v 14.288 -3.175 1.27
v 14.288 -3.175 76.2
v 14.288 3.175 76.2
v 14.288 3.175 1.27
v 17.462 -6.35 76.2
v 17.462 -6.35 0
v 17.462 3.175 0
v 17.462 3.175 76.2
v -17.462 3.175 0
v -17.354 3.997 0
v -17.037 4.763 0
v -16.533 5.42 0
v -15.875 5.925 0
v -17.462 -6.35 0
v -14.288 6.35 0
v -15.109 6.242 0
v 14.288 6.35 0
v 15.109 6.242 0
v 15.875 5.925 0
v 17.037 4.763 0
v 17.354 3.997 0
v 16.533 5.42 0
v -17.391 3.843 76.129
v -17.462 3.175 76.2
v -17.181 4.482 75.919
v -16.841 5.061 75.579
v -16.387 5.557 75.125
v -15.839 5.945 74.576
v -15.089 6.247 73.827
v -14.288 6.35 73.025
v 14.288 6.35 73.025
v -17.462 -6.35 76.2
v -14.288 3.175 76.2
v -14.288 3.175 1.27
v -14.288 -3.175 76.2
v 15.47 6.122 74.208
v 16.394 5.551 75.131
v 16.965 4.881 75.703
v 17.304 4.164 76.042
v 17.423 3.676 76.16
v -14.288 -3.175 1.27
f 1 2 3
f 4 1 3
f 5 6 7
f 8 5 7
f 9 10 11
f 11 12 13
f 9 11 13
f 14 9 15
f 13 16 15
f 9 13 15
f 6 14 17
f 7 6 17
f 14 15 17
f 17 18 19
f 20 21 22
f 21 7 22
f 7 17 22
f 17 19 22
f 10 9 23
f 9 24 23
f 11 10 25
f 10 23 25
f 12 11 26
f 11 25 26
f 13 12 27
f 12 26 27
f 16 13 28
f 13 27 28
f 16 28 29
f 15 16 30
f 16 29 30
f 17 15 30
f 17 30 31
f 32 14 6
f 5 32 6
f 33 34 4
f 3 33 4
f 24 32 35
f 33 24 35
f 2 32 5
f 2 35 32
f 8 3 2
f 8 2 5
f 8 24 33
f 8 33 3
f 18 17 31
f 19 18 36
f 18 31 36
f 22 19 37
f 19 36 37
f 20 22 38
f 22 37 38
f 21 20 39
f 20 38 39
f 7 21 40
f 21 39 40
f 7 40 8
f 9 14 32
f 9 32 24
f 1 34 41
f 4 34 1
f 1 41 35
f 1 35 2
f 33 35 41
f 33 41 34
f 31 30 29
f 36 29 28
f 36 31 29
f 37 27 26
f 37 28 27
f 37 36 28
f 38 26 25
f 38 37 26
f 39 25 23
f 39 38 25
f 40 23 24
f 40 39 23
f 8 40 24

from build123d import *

# Parameters (mm, degrees)
SKETCH1_W           = 34.925
SKETCH1_H           = 12.7
BOSS_EXTRUDE1_DEPTH = 76.2
SKETCH2_W           = 28.575
SKETCH2_H           = 6.35
CUT_EXTRUDE1_DEPTH  = 74.93
FILLET1_R           = 3.175


with BuildPart() as part:
    # Sketch1 → Boss-Extrude1 (new body)
    with BuildSketch(Plane.XY):
        Rectangle(SKETCH1_W, SKETCH1_H)
    extrude(amount=BOSS_EXTRUDE1_DEPTH)

    # Sketch2 → Cut-Extrude1 (cut)
    with BuildSketch(Plane.XY.offset(76.2)):
        Rectangle(SKETCH2_W, SKETCH2_H)
    extrude(amount=-CUT_EXTRUDE1_DEPTH, mode=Mode.SUBTRACT)

    # Fillet1
    fillet1_edges = [part.edges().sort_by_distance(p)[0] for p in [
        (-17.4625, 6.35, 38.1),
        (17.4625, 6.35, 38.1),
        (0, 6.35, 76.2),
    ]]
    fillet(fillet1_edges, radius=FILLET1_R - 0.0001)  # a hair under: the kernel refuses the full size


solid = part.part
